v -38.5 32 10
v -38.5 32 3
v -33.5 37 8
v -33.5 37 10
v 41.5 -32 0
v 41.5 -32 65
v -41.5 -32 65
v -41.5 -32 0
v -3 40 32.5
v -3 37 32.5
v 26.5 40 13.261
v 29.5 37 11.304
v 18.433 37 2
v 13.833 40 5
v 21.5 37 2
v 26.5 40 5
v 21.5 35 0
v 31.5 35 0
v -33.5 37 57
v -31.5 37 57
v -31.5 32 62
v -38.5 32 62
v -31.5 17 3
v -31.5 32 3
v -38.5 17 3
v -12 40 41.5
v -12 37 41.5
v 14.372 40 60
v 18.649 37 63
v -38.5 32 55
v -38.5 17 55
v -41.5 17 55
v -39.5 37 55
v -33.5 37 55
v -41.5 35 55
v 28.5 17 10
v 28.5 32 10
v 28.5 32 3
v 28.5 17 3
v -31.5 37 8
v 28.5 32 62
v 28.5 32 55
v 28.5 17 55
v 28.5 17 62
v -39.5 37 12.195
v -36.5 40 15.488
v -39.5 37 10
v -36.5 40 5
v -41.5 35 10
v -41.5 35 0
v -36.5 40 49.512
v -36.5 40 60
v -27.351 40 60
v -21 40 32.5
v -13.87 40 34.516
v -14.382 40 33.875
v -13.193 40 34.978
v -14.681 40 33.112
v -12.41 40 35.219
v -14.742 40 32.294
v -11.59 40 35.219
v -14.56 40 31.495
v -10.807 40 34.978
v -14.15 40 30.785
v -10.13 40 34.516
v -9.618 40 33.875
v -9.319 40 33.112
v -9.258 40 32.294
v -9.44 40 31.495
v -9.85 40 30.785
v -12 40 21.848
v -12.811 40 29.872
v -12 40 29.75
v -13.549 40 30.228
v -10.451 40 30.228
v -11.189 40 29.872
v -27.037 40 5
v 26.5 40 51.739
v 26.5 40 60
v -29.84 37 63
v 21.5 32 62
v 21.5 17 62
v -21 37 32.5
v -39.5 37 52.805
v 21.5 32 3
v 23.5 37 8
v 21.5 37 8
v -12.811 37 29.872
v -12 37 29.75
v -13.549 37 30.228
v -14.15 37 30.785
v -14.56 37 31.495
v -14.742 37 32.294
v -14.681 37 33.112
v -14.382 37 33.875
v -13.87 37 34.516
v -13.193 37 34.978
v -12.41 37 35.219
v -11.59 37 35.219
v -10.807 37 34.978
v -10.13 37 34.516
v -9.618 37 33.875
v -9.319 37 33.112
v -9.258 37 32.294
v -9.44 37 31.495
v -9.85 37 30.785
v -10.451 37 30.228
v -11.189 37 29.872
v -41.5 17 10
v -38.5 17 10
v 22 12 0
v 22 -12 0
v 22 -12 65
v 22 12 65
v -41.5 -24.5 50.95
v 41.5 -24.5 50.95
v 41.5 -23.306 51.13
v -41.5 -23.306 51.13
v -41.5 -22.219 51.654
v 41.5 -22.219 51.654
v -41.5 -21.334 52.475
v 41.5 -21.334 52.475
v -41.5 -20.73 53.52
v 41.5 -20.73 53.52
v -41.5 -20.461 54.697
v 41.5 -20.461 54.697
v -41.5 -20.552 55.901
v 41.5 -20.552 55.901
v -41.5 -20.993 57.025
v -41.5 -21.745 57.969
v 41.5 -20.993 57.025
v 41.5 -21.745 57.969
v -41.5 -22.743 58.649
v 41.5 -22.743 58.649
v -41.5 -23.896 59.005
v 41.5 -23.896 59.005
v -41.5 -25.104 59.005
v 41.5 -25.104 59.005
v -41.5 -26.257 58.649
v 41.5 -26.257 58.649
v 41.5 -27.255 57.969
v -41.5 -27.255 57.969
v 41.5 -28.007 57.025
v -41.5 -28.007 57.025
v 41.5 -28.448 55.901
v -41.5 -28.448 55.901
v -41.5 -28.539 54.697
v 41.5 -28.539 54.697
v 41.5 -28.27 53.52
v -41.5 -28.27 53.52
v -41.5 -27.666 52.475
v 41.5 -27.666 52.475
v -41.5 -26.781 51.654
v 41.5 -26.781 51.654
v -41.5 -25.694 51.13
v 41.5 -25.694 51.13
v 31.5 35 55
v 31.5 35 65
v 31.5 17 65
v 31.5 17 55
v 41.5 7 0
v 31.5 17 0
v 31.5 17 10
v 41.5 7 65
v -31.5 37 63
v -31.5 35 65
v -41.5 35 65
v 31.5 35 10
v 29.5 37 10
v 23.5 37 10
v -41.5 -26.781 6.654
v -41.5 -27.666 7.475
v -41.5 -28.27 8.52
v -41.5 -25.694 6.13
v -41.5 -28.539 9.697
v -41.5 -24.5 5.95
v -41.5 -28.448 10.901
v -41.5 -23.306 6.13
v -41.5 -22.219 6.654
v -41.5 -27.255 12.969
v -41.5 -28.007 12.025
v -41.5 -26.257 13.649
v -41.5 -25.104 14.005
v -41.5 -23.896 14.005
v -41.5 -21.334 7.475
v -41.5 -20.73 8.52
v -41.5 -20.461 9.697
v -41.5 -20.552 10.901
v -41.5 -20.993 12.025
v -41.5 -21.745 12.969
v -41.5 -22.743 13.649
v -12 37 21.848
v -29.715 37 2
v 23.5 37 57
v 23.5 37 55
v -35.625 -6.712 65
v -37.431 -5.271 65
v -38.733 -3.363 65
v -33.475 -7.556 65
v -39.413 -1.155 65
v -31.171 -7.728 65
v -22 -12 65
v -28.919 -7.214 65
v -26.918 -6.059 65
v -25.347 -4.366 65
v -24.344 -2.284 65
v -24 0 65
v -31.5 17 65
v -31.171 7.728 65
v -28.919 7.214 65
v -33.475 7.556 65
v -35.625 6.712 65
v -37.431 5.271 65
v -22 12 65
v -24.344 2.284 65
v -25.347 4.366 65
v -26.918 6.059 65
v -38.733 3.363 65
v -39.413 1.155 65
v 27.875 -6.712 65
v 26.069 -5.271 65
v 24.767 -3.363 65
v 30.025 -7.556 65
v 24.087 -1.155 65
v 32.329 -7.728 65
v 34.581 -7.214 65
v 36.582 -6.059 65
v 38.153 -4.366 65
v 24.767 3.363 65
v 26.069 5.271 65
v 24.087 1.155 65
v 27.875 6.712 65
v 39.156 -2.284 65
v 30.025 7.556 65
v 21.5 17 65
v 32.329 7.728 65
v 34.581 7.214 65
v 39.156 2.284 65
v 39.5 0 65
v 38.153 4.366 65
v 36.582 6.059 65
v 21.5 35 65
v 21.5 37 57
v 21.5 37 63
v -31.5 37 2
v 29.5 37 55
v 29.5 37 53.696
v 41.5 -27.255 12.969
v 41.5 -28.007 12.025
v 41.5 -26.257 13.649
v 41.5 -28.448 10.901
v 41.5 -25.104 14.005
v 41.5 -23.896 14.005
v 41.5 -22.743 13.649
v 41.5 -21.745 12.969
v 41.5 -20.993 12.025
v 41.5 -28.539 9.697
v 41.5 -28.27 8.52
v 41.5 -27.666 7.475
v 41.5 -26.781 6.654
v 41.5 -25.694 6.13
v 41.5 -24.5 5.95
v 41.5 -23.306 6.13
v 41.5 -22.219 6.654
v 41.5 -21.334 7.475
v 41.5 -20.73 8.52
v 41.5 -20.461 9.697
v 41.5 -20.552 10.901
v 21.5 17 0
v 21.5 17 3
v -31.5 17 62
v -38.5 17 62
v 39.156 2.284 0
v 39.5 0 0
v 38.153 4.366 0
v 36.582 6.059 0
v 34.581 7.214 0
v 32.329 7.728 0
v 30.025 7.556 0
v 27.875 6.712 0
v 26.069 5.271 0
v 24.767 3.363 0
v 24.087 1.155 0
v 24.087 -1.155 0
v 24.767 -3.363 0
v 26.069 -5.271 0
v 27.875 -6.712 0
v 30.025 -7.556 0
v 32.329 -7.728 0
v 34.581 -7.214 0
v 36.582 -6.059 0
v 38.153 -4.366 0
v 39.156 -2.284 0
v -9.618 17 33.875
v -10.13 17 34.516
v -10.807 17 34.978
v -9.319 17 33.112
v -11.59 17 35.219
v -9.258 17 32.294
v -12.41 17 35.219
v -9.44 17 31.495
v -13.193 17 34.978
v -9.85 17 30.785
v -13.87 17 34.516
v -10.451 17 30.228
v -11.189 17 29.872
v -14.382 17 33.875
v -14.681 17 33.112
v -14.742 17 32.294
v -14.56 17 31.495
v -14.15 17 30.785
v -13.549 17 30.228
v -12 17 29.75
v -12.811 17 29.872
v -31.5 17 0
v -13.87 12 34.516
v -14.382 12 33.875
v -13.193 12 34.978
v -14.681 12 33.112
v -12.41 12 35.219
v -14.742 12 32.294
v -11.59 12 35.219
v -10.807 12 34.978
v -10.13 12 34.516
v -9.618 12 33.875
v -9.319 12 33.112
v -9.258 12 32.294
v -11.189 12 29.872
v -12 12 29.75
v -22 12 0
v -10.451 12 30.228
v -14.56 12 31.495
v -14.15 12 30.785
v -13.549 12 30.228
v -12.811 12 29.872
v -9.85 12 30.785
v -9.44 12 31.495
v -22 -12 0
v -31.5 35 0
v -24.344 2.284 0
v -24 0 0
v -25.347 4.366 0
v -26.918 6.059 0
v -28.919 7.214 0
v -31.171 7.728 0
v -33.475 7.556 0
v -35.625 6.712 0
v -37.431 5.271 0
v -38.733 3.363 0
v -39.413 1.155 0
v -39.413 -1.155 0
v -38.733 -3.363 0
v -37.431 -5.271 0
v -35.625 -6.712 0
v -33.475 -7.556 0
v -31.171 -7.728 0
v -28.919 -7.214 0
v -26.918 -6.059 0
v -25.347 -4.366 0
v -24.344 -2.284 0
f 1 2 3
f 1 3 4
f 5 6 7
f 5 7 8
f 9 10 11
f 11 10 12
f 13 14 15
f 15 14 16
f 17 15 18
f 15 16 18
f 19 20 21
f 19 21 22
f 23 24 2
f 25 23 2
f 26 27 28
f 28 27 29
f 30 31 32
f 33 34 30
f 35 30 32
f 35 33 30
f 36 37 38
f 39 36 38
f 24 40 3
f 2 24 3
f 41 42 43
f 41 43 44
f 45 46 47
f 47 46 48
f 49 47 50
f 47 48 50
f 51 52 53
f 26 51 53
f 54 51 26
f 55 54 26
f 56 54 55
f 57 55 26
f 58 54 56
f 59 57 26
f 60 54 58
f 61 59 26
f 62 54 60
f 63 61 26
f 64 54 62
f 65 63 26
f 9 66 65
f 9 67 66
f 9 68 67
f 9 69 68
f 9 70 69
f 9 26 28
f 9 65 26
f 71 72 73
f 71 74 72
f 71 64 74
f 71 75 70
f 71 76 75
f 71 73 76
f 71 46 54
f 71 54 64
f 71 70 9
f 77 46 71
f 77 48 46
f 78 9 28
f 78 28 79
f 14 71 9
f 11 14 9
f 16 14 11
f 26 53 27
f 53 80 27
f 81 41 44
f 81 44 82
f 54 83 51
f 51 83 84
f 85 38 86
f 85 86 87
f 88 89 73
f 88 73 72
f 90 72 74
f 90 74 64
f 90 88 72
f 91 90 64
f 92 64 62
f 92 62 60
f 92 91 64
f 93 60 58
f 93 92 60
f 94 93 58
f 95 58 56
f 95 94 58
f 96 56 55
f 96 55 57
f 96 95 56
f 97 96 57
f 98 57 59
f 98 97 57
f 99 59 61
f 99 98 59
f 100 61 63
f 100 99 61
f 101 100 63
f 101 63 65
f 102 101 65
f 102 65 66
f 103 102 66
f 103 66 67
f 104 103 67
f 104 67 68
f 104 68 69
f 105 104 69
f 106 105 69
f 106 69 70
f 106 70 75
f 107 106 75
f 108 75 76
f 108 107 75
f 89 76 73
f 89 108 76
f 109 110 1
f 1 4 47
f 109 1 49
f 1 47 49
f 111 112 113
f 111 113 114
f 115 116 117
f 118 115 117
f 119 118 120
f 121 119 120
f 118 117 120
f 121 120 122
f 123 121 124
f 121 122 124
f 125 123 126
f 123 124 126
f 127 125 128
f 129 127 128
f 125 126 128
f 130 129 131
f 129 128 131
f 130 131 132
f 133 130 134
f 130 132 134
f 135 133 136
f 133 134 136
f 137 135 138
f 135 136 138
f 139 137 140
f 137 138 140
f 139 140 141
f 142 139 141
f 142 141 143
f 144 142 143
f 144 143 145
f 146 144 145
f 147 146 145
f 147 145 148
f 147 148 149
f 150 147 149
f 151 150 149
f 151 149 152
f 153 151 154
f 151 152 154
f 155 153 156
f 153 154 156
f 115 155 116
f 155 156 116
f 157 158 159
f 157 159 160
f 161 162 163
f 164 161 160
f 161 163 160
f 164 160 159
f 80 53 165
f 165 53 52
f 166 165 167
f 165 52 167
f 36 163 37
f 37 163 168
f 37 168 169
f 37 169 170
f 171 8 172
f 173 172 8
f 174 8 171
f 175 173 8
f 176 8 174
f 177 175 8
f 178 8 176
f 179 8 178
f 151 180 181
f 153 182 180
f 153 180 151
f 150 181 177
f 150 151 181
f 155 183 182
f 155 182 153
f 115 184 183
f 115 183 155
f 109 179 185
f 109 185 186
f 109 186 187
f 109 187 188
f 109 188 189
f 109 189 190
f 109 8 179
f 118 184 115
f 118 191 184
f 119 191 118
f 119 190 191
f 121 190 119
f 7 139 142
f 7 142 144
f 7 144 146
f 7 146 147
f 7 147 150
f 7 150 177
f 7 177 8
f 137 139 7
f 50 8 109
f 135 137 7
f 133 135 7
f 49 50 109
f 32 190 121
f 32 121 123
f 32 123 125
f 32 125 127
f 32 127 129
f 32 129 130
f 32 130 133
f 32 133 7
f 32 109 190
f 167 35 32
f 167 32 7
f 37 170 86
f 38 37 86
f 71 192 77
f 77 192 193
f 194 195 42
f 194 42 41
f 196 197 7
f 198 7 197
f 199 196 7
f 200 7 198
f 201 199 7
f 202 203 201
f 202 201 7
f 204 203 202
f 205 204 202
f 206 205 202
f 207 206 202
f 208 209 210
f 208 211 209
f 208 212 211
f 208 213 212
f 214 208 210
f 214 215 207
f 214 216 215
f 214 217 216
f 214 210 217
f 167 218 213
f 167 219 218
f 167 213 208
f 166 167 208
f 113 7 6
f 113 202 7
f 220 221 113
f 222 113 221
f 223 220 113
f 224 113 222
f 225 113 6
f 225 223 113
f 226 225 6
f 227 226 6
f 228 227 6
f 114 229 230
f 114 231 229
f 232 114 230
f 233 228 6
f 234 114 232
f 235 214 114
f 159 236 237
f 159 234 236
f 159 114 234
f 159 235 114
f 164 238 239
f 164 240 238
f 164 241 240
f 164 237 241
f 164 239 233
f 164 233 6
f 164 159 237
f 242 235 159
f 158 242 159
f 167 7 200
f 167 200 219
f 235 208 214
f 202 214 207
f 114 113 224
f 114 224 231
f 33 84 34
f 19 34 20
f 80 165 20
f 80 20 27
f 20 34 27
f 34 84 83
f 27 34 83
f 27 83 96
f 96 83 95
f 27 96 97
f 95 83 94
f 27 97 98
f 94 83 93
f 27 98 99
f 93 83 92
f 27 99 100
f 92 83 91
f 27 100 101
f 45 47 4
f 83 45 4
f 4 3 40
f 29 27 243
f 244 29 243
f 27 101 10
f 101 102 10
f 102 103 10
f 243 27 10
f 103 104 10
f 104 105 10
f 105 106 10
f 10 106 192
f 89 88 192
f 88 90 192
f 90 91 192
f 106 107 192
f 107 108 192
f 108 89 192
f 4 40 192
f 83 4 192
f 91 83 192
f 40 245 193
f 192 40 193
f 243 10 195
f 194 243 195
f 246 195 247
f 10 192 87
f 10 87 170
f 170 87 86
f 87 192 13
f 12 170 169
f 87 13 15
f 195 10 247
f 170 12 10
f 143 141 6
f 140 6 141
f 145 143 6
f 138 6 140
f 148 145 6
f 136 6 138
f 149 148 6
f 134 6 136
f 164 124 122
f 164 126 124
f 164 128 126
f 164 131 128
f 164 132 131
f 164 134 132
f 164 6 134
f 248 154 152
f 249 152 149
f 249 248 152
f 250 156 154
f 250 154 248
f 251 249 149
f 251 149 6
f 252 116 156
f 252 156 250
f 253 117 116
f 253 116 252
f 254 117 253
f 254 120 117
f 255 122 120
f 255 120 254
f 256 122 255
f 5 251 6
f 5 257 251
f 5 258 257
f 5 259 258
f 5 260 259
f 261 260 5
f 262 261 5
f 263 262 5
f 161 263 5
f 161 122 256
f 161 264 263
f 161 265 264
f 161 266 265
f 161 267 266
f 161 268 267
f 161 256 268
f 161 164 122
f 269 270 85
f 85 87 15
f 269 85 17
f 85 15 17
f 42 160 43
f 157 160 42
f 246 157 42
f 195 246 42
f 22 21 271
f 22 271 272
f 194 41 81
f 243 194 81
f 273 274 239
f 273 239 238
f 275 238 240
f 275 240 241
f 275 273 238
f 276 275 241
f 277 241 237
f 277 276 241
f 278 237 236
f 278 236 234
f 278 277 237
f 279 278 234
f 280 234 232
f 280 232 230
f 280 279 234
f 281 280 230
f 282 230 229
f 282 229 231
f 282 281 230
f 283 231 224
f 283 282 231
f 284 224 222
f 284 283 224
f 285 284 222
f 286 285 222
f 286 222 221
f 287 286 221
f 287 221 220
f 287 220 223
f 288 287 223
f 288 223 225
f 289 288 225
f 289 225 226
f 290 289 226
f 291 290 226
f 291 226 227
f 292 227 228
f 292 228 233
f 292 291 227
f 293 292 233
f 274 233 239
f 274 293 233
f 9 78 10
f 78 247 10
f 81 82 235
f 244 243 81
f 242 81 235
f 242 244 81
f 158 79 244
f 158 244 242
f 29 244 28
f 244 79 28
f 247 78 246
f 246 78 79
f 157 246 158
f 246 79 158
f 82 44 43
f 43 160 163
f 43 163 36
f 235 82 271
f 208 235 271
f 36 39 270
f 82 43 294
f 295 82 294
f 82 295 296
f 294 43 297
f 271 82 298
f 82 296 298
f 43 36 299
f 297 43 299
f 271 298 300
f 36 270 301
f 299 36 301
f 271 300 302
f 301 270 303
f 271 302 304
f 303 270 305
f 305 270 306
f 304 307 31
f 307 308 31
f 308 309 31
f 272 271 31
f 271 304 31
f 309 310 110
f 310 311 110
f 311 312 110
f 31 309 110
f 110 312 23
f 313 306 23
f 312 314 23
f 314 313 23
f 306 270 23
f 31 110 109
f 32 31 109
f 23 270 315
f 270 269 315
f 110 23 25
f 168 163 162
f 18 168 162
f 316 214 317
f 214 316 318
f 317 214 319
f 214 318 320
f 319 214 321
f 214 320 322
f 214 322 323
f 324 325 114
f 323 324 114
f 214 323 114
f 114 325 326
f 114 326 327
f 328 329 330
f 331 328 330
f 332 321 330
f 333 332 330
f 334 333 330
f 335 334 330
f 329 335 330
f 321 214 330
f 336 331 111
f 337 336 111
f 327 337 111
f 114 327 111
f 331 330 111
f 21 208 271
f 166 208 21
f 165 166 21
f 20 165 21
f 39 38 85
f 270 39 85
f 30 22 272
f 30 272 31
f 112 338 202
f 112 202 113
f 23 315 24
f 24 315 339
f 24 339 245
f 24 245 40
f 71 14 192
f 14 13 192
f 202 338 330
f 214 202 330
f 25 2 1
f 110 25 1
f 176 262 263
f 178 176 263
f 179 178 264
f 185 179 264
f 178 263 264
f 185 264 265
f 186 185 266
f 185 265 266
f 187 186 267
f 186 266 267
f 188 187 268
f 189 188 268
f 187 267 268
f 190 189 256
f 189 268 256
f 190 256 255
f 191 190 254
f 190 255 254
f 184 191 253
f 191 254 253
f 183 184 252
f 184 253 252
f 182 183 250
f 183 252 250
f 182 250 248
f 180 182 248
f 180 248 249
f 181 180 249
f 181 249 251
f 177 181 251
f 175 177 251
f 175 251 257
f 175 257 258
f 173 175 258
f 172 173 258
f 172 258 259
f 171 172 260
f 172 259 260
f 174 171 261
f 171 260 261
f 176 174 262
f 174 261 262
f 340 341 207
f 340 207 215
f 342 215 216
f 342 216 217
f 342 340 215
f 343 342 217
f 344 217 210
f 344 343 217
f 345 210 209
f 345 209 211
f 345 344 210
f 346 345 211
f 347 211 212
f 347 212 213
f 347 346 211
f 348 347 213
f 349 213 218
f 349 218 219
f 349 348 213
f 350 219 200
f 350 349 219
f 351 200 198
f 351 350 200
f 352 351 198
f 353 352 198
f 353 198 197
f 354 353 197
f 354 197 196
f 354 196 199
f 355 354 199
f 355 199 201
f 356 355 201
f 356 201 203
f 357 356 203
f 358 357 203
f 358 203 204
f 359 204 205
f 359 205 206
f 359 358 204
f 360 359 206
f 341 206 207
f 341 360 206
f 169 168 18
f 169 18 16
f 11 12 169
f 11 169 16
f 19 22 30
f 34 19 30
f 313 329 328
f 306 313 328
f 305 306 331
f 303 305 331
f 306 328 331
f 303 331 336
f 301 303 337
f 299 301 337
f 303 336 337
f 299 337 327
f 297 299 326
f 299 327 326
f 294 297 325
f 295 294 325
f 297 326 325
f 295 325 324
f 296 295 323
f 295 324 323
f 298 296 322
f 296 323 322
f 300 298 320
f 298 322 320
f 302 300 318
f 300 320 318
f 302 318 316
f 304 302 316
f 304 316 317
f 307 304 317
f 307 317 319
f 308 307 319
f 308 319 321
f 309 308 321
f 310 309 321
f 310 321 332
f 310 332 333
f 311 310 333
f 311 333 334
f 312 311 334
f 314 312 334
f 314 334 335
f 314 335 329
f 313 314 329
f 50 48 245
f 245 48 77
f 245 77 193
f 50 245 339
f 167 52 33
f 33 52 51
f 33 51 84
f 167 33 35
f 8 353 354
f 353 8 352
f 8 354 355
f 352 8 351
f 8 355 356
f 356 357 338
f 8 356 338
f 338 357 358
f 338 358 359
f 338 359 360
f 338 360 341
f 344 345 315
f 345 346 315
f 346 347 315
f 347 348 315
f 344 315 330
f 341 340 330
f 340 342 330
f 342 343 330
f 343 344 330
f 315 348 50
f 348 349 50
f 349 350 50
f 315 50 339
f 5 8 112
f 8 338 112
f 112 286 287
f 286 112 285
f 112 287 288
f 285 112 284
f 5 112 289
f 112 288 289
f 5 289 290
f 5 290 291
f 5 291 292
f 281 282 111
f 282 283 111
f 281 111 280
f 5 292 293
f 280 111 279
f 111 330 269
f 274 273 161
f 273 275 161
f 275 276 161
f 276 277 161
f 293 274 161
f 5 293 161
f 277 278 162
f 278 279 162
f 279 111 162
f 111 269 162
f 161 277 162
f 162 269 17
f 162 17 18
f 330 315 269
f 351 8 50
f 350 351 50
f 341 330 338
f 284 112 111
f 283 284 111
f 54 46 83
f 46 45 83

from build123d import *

# Parameters (mm, degrees)
SKETCH1_R           = 7.75
SKETCH1_W           = 44
SKETCH1_H           = 24
BOSS_EXTRUDE1_DEPTH = 65
SKETCH5_W           = 65
SKETCH5_H           = 15
SKETCH5_R           = 4.05
BOSS_EXTRUDE4_DEPTH = 83
CHAMFER1_SIZE       = 10
SKETCH6_R           = 2.75
CUT_EXTRUDE1_DEPTH  = 15
SKETCH8_R           = 2.75
BOSS_EXTRUDE5_DEPTH = 3
EXTRUDE_THIN2_DEPTH = 20
CHAMFER2_SIZE       = 5
CHAMFER3_SIZE       = 5


with BuildPart() as part:
    # Sketch1 → Boss-Extrude1 (new body)
    with BuildSketch(Plane.XY):
        Polygon((31.75, 17), (-31.75, 17), (-41.5, 17), (-41.5, -17), (-31.75, -17), (31.75, -17), (41.5, -17), (41.5, 17), align=None)
        with Locations((-31.75, 0)):
            Circle(SKETCH1_R, mode=Mode.SUBTRACT)
        with Locations((31.75, 0)):
            Circle(SKETCH1_R, mode=Mode.SUBTRACT)
        Rectangle(SKETCH1_W, SKETCH1_H, mode=Mode.SUBTRACT)
    extrude(amount=BOSS_EXTRUDE1_DEPTH)

    # Sketch5 → Boss-Extrude4 (add)
    with BuildSketch(Plane(origin=(41.5, 0, 0), x_dir=(0, 0, -1), z_dir=(1, 0, 0))):
        with Locations((-32.5, -24.5)):
            Rectangle(SKETCH5_W, SKETCH5_H)
        with Locations((-55, -24.5)):
            Circle(SKETCH5_R, mode=Mode.SUBTRACT)
        with Locations((-10, -24.5)):
            Circle(SKETCH5_R, mode=Mode.SUBTRACT)
    extrude(amount=-BOSS_EXTRUDE4_DEPTH)

    # Chamfer1
    chamfer1_edges = [part.edges().sort_by_distance(p)[0] for p in [
        (41.5, 17, 32.5),
    ]]
    chamfer(chamfer1_edges, length=CHAMFER1_SIZE)

    # Sketch6 → Cut-Extrude1 (cut)
    with BuildSketch(Plane(origin=(0, 12, 0), x_dir=(-1, 0, 0), z_dir=(0, -1, 0))):
        with Locations(Location((12, -32.5, 0), (0, 0, 90))):
            Circle(SKETCH6_R)
    extrude(amount=-CUT_EXTRUDE1_DEPTH, mode=Mode.SUBTRACT)



with BuildPart() as body_2:
    # Sketch8 → Boss-Extrude5 (new body)
    with BuildSketch(Plane(origin=(0, 37, 0), x_dir=(1, 0, 0), z_dir=(0, 1, 0))):
        Polygon((-41.5, -10), (-21, -32.5), (-41.5, -55), (-41.5, -65), (-31.5, -65), (-12, -41.5), (21.5, -65), (31.5, -65), (31.5, -55), (-3, -32.5), (31.5, -10), (31.5, 0), (21.5, 0), (-12, -21.847826087), (-31.5, 0), (-41.5, 0), align=None)
        with Locations(Location((-12, -32.5, 0), (0, 0, 90))):
            Circle(SKETCH8_R, mode=Mode.SUBTRACT)
    extrude(amount=BOSS_EXTRUDE5_DEPTH)


with BuildPart() as part_1:
    add(part.part)

    add(body_2.part)  # Extrude-Thin2 merges body 2
    # Sketch9 → Extrude-Thin2 (add)
    with BuildSketch(Plane(origin=(0, 37, 0), x_dir=(-1, 0, 0), z_dir=(0, -1, 0))):
        Polygon((41.5, -10), (41.5, 0), (31.5, 0), (31.5, -3), (38.5, -3), (38.5, -10), align=None)
        Polygon((-21.5, 0), (-31.5, 0), (-31.5, -10), (-28.5, -10), (-28.5, -3), (-21.5, -3), align=None)
    extrude_thin2 = extrude(amount=EXTRUDE_THIN2_DEPTH)

    # Mirror1: Extrude-Thin2 across plane
    add(extrude_thin2.mirror(Plane.XY.offset(32.5)))

    # Chamfer2
    chamfer2_edges = [part_1.edges().sort_by_distance(p)[0] for p in [
        (25, 37, 3),
        (28.5, 37, 6.5),
        (-38.5, 37, 58.5),
        (-35, 37, 62),
        (25, 37, 62),
        (28.5, 37, 58.5),
        (-38.5, 37, 6.5),
        (-35, 37, 3),
    ]]
    chamfer(chamfer2_edges, length=CHAMFER2_SIZE)

    # Chamfer3
    # the kernel refuses this chamfer: 5 mm, written as the material it takes off along each edge
    with BuildSketch(Plane(origin=(-41.5, 40, 42.14158506), x_dir=(0.9996219169112968, 0.0274958766105877, 0), z_dir=(0, 0, 1)), Plane(origin=(-54.35841494, 40, 65), x_dir=(0, 0.027495876610586317, -0.9996219169112968), z_dir=(1, 0, 0)), Plane(origin=(8.64158506, 40, 65), x_dir=(0, 0.027495876610586317, -0.9996219169112968), z_dir=(1, 0, 0)), Plane(origin=(31.5, 40, 77.85841494), x_dir=(-0.9996219169112968, 0.027495876610584936, 0), z_dir=(0, 0, -1)), Plane(origin=(44.35841494, 40, 0), x_dir=(0, 0.027495876610586317, 0.9996219169112968), z_dir=(-1, 0, 0)), Plane(origin=(-18.64158506, 40, 0), x_dir=(-1.1764219776297879e-15, 0.027495876610586317, 0.9996219169112968), z_dir=(-1, 0, 0)), Plane(origin=(-41.5, 40, -12.85841494), x_dir=(0.9996219169112968, 0.0274958766105877, 1.4205481831358163e-15), z_dir=(0, 0, 1))) as chamfer3_piece_1:
        Polygon((CHAMFER3_SIZE * 0.999621916911, -CHAMFER3_SIZE * 0.0274958766106), (-CHAMFER3_SIZE * 0.0274958766106, -CHAMFER3_SIZE * 0.999621916911), (0, 0), align=None)
    extrude(amount=35.71682988, mode=Mode.SUBTRACT)
    with BuildSketch(Plane(origin=(31.5, 40, 22.85841494), x_dir=(0.02749587661058701, -0.9996219169112968, 0), z_dir=(0, 0, -1))) as chamfer3_piece_2:
        Polygon((CHAMFER3_SIZE * 0.999621916911, CHAMFER3_SIZE * 0.0274958766106), (-CHAMFER3_SIZE * 0.0274958766106, CHAMFER3_SIZE * 0.999621916911), (0, 0), align=None)
    extrude(amount=35.71682988, mode=Mode.SUBTRACT)


solid = part_1.part
